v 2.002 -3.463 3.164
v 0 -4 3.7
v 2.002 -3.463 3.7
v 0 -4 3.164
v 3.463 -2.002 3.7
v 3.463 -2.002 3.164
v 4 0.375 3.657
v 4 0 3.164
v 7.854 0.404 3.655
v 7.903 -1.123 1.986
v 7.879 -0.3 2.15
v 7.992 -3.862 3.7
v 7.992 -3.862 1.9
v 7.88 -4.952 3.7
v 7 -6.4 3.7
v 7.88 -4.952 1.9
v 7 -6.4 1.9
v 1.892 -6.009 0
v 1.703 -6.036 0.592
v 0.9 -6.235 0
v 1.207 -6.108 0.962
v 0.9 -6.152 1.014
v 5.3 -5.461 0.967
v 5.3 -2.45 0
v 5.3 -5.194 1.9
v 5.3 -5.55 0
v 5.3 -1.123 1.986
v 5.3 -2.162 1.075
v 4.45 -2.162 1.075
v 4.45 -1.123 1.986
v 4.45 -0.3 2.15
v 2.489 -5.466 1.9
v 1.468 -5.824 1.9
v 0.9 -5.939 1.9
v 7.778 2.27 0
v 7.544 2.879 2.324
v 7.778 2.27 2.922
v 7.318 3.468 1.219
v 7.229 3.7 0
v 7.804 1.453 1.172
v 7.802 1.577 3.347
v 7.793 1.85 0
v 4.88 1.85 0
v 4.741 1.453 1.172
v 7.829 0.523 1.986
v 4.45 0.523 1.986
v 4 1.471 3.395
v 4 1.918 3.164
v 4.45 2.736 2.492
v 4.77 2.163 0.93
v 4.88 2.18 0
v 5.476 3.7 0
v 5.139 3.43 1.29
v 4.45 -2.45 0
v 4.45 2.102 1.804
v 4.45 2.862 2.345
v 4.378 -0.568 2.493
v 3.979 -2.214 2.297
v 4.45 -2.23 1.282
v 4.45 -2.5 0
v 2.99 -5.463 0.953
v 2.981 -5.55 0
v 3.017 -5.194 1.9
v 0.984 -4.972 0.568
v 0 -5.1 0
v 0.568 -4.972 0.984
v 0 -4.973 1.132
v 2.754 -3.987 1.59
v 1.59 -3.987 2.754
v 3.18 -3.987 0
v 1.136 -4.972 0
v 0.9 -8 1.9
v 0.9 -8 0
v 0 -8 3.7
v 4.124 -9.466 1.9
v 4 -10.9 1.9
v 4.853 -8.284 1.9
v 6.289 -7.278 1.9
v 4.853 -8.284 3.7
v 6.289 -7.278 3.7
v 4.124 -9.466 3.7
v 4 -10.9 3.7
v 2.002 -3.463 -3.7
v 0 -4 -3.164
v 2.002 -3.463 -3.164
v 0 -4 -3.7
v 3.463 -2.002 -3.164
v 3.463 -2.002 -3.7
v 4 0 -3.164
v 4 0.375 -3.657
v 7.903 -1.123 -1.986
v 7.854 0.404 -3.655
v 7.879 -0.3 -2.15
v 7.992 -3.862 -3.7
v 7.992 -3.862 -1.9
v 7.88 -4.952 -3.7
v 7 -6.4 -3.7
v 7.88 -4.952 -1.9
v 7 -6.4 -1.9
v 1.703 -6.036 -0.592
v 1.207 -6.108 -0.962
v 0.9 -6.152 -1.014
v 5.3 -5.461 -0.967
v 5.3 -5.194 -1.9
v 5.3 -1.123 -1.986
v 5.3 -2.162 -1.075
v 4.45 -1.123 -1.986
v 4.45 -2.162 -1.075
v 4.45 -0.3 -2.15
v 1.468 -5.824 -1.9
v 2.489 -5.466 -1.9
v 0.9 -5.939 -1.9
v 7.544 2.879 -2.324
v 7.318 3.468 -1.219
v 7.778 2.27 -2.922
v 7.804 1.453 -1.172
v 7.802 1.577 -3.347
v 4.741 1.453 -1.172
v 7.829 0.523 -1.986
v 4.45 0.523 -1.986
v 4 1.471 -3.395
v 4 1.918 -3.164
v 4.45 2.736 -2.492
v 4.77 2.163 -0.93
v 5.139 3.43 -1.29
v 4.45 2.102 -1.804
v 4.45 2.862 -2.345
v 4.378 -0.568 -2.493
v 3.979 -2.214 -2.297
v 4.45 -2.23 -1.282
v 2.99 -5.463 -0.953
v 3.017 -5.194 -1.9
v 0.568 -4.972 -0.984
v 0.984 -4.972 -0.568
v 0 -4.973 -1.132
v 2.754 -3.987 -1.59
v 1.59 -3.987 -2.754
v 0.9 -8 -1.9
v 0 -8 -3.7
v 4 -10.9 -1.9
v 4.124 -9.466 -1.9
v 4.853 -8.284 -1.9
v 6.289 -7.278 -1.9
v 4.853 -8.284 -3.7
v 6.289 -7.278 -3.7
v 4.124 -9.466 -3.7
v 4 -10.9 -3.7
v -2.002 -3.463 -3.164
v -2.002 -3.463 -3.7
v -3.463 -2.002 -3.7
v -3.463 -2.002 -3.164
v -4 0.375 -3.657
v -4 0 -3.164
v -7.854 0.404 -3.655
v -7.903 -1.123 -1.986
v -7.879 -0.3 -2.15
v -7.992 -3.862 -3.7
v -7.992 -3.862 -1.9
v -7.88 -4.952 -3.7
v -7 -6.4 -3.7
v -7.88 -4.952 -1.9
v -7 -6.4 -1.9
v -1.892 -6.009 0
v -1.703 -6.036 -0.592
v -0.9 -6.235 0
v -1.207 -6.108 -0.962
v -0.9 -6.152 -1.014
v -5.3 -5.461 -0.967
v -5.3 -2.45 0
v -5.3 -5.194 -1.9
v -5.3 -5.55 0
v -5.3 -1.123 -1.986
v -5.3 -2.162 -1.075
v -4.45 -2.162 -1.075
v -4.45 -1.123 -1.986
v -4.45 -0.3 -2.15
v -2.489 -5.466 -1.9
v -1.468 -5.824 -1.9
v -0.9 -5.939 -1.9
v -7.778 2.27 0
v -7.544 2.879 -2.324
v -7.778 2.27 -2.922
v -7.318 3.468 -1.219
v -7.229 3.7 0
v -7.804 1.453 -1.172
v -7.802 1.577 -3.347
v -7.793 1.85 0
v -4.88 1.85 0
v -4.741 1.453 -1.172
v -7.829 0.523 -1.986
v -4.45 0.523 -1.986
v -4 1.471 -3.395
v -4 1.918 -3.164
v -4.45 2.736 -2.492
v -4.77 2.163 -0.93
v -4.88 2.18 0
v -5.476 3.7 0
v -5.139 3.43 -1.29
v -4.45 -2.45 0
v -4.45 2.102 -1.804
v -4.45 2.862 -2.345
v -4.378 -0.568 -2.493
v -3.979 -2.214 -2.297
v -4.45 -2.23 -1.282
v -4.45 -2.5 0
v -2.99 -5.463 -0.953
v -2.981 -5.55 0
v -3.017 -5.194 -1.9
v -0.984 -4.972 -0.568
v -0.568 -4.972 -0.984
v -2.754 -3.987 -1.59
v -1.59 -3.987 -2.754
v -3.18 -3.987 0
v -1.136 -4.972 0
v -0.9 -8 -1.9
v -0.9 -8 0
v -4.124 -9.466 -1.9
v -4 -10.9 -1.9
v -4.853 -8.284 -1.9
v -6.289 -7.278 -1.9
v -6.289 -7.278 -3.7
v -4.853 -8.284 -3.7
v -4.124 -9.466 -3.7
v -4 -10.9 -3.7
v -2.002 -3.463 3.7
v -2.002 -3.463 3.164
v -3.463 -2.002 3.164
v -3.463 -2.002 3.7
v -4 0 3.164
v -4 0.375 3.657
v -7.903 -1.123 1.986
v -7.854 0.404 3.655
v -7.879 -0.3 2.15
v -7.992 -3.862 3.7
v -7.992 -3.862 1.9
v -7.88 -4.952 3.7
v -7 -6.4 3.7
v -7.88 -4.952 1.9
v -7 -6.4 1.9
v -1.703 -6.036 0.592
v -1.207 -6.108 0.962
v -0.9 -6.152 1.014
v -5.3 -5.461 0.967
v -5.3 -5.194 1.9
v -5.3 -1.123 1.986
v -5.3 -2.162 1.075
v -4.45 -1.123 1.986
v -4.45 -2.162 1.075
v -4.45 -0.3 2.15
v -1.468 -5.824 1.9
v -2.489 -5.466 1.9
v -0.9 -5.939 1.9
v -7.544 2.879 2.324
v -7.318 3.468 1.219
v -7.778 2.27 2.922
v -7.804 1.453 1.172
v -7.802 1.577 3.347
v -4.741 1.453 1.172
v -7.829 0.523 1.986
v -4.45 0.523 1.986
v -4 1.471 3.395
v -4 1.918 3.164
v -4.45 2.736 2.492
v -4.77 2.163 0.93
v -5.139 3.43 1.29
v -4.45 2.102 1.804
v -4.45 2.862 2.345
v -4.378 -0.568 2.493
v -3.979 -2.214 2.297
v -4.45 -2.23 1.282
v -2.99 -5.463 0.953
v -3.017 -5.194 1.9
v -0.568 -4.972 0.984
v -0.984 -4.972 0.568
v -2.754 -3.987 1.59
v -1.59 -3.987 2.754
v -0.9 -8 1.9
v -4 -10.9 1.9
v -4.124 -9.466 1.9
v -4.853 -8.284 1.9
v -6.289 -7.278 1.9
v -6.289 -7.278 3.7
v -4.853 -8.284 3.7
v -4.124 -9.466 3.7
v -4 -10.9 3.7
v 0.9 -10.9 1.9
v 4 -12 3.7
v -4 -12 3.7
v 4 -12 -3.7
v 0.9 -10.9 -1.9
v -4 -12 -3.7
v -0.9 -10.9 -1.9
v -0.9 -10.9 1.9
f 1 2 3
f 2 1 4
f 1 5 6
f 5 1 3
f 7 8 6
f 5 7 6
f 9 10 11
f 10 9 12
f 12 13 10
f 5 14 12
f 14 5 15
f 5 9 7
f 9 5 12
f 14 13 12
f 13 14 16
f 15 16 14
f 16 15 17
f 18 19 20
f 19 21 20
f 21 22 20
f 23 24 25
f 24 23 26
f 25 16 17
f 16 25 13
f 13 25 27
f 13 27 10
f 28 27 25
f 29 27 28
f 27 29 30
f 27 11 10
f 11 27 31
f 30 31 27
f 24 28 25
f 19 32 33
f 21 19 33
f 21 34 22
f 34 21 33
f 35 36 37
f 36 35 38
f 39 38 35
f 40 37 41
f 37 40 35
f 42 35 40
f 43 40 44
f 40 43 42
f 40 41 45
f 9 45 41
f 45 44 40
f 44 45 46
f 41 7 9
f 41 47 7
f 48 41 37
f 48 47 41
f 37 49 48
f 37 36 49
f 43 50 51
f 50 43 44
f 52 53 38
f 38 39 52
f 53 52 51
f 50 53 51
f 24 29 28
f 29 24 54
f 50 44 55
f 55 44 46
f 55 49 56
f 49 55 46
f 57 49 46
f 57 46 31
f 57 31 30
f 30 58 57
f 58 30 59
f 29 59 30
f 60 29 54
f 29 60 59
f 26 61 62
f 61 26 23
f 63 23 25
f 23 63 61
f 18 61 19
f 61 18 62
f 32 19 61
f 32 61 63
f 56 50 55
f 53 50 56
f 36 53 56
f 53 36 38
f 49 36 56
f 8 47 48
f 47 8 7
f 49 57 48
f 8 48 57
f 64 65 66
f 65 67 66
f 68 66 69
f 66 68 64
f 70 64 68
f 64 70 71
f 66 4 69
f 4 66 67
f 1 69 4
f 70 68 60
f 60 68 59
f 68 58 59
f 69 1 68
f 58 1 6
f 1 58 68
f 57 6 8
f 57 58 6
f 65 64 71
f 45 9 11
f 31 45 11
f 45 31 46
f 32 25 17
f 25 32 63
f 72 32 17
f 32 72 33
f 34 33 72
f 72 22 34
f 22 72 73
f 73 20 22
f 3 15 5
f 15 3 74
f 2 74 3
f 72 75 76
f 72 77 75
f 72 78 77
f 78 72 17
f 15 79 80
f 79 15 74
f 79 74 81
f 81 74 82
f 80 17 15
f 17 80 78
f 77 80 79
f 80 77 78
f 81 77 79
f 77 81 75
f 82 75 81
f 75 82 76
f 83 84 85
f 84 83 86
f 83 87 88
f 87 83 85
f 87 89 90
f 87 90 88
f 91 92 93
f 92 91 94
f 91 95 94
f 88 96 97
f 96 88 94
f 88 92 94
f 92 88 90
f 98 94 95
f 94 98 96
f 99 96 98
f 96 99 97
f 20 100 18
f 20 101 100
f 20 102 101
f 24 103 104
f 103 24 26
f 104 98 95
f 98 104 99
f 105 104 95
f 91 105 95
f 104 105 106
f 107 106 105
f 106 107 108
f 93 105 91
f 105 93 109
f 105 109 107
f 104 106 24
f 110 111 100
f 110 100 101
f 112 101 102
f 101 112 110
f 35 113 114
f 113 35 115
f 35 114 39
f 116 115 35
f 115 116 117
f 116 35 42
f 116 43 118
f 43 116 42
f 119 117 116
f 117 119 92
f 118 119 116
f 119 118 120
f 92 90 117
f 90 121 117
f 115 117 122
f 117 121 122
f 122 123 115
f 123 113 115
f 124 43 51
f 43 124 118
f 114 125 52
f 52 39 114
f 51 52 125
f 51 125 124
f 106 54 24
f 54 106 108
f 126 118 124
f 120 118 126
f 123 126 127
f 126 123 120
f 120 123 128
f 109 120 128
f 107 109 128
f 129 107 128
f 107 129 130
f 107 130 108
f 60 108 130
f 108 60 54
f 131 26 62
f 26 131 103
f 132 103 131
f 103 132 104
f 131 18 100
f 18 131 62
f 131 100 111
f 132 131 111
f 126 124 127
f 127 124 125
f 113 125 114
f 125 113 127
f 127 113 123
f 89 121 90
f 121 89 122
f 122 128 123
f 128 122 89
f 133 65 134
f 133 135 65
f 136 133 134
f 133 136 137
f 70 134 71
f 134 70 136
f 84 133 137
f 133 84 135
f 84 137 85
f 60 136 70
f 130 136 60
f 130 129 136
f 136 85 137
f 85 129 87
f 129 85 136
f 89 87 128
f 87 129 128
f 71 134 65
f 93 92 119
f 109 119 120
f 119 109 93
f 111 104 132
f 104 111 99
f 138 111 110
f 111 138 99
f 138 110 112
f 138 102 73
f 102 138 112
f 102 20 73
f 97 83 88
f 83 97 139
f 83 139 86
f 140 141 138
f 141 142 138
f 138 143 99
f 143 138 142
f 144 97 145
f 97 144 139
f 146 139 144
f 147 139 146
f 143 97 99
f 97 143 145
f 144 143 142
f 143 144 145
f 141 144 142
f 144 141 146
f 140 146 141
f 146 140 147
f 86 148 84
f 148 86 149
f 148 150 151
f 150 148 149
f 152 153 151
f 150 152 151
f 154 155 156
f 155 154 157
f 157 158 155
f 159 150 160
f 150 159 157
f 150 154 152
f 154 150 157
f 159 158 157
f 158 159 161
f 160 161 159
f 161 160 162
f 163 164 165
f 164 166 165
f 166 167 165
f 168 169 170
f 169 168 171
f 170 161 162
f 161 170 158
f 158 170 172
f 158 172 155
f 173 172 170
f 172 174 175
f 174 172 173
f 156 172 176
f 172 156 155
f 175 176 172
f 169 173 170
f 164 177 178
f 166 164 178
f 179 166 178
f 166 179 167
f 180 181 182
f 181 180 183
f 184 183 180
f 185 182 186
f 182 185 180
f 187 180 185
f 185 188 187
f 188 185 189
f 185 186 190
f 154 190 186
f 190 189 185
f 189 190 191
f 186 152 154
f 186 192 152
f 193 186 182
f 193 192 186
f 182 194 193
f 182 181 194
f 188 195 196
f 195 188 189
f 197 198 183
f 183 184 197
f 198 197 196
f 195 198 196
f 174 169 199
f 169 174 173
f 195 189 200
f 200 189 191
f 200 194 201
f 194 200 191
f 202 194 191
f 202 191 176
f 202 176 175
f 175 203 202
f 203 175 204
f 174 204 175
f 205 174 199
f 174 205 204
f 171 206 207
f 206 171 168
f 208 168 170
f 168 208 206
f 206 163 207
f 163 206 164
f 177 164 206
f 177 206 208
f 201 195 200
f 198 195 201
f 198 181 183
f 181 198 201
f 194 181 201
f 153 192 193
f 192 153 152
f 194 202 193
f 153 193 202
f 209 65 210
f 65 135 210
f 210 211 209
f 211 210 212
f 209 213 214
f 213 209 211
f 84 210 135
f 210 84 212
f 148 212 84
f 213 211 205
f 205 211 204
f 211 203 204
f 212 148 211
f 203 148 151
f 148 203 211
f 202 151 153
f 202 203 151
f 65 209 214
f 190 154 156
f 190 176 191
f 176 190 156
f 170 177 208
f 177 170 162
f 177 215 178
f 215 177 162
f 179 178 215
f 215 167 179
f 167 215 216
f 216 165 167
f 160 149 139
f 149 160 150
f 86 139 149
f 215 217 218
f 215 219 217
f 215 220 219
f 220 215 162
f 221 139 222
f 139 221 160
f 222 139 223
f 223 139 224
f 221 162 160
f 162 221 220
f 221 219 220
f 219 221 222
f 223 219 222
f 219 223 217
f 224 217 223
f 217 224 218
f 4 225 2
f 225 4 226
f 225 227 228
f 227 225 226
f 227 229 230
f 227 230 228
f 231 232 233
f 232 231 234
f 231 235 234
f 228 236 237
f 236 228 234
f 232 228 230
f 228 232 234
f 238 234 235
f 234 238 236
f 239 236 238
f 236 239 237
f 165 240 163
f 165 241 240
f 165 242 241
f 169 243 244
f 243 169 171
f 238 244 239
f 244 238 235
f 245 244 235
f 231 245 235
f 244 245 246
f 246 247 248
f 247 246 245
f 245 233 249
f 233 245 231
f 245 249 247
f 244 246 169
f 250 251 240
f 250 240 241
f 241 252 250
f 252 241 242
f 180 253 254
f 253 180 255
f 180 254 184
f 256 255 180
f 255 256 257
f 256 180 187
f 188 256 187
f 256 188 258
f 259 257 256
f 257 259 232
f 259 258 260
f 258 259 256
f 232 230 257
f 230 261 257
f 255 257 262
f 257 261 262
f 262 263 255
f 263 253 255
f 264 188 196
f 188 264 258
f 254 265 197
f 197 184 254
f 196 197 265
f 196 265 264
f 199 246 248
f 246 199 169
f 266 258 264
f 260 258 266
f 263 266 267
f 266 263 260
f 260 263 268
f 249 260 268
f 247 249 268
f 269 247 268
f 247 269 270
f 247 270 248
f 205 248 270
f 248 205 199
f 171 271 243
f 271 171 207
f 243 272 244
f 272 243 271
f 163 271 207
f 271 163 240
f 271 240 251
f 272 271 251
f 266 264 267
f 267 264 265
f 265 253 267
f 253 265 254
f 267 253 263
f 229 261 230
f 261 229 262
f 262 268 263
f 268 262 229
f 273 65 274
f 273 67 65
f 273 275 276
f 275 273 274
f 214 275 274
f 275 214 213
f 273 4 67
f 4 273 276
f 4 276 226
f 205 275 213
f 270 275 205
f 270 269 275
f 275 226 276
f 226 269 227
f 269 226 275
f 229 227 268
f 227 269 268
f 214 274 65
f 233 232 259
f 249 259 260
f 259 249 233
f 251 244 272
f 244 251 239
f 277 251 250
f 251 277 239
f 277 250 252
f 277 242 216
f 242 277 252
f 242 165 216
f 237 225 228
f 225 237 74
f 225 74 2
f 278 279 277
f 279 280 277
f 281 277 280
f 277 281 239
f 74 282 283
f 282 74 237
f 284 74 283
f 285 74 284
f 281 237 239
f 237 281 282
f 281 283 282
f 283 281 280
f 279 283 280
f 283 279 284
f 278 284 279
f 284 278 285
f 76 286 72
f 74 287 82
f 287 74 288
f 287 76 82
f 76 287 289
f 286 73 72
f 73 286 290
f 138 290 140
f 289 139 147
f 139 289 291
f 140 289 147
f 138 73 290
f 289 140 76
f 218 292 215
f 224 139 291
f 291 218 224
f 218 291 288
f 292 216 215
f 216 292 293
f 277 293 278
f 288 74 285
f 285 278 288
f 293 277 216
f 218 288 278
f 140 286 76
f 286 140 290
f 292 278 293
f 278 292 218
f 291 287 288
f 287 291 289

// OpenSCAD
use <../../lib.scad>
use <../../p/rect.scad>
use <90617s05.scad>
$fa=1; $fs=0.2;
function ldraw_lib__s__90617s03(realsolid=false) = [
// 0 ~Constraction Socket with Square Base
// 0 Name: s\90617s03.dat
// 0 Author: Magnus Forsberg [MagFors]
// 0 !LDRAW_ORG Subpart UPDATE 2018-02
// 0 !LICENSE Licensed under CC BY 2.0 and CC BY 4.0 : see CAreadme.txt
// 
// 0 BFC CERTIFY CCW
  [0,"BFC","CERTIFY"],
  [0,"BFC","CCW"],
// 
// 0 !HISTORY 2018-12-08 [PTadmin] Official Update 2018-02
// 
// 
// 1 16 0 0 0 1 0 0 0 1 0 0 0 1 s\90617s05.dat
  [1,16,0,0,0,1,0,0,0,1,0,0,0,1, ldraw_lib__s__90617s05(realsolid)],
// 1 16 0 0 0 1 0 0 0 -1 0 0 0 1 s\90617s05.dat
  [1,16,0,0,0,1,0,0,0,-1,0,0,0,1, ldraw_lib__s__90617s05(realsolid)],
// 1 16 0 0 0 -1 0 0 0 -1 0 0 0 1 s\90617s05.dat
  [1,16,0,0,0,-1,0,0,0,-1,0,0,0,1, ldraw_lib__s__90617s05(realsolid)],
// 1 16 0 0 0 -1 0 0 0 1 0 0 0 1 s\90617s05.dat
  [1,16,0,0,0,-1,0,0,0,1,0,0,0,1, ldraw_lib__s__90617s05(realsolid)],
// 2 24 10 -9.25 -27.25 10 -9.25 -30
  [2,24,10,-9.25,-27.25,10,-9.25,-30],
// 2 24 10 9.25 -27.25 10 9.25 -30
  [2,24,10,9.25,-27.25,10,9.25,-30],
// 2 24 2.25 -4.75 -27.25 2.25 -4.75 -20
  [2,24,2.25,-4.75,-27.25,2.25,-4.75,-20],
// 2 24 2.25 4.75 -20 2.25 4.75 -27.25
  [2,24,2.25,4.75,-20,2.25,4.75,-27.25],
// 3 16 10 -4.75 -27.25 2.25 -4.75 -27.25 2.25 -4.75 -20
  [3,16,10,-4.75,-27.25,2.25,-4.75,-27.25,2.25,-4.75,-20],
// 4 16 10 -9.25 -30 10 -9.25 -27.25 0 -9.25 -20 -10 -9.25 -30
  [4,16,10,-9.25,-30,10,-9.25,-27.25,0,-9.25,-20,-10,-9.25,-30],
// 4 16 10 -4.75 -27.25 10 -9.25 -27.25 10 -9.25 -30 10 9.25 -30
  [4,16,10,-4.75,-27.25,10,-9.25,-27.25,10,-9.25,-30,10,9.25,-30],
// 4 16 2.25 0 -20 2.25 -4.75 -20 2.25 -4.75 -27.25 2.25 4.75 -27.25
  [4,16,2.25,0,-20,2.25,-4.75,-20,2.25,-4.75,-27.25,2.25,4.75,-27.25],
// 3 16 2.25 4.75 -20 2.25 4.75 -27.25 10 4.75 -27.25
  [3,16,2.25,4.75,-20,2.25,4.75,-27.25,10,4.75,-27.25],
// 4 16 0 9.25 -20 10 9.25 -27.25 10 9.25 -30 -10 9.25 -30
  [4,16,0,9.25,-20,10,9.25,-27.25,10,9.25,-30,-10,9.25,-30],
// 3 16 10 4.75 -27.25 10 9.25 -30 10 9.25 -27.25
  [3,16,10,4.75,-27.25,10,9.25,-30,10,9.25,-27.25],
// 3 16 2.25 4.75 -20 2.25 0 -20 2.25 4.75 -27.25
  [3,16,2.25,4.75,-20,2.25,0,-20,2.25,4.75,-27.25],
// 3 16 10 9.25 -30 10 4.75 -27.25 10 -4.75 -27.25
  [3,16,10,9.25,-30,10,4.75,-27.25,10,-4.75,-27.25],
// 2 24 -10 9.25 -27.25 -10 9.25 -30
  [2,24,-10,9.25,-27.25,-10,9.25,-30],
// 2 24 -10 -9.25 -27.25 -10 -9.25 -30
  [2,24,-10,-9.25,-27.25,-10,-9.25,-30],
// 2 24 -2.25 4.75 -27.25 -2.25 4.75 -20
  [2,24,-2.25,4.75,-27.25,-2.25,4.75,-20],
// 2 24 -2.25 -4.75 -20 -2.25 -4.75 -27.25
  [2,24,-2.25,-4.75,-20,-2.25,-4.75,-27.25],
// 3 16 -10 4.75 -27.25 -2.25 4.75 -27.25 -2.25 4.75 -20
  [3,16,-10,4.75,-27.25,-2.25,4.75,-27.25,-2.25,4.75,-20],
// 3 16 -10 9.25 -27.25 0 9.25 -20 -10 9.25 -30
  [3,16,-10,9.25,-27.25,0,9.25,-20,-10,9.25,-30],
// 4 16 -10 4.75 -27.25 -10 9.25 -27.25 -10 9.25 -30 -10 -9.25 -30
  [4,16,-10,4.75,-27.25,-10,9.25,-27.25,-10,9.25,-30,-10,-9.25,-30],
// 4 16 -2.25 0 -20 -2.25 4.75 -20 -2.25 4.75 -27.25 -2.25 -4.75 -27.25
  [4,16,-2.25,0,-20,-2.25,4.75,-20,-2.25,4.75,-27.25,-2.25,-4.75,-27.25],
// 3 16 -2.25 -4.75 -20 -2.25 -4.75 -27.25 -10 -4.75 -27.25
  [3,16,-2.25,-4.75,-20,-2.25,-4.75,-27.25,-10,-4.75,-27.25],
// 3 16 -10 -9.25 -30 0 -9.25 -20 -10 -9.25 -27.25
  [3,16,-10,-9.25,-30,0,-9.25,-20,-10,-9.25,-27.25],
// 3 16 -10 -9.25 -27.25 -10 -4.75 -27.25 -10 -9.25 -30
  [3,16,-10,-9.25,-27.25,-10,-4.75,-27.25,-10,-9.25,-30],
// 3 16 -2.25 -4.75 -27.25 -2.25 -4.75 -20 -2.25 0 -20
  [3,16,-2.25,-4.75,-27.25,-2.25,-4.75,-20,-2.25,0,-20],
// 3 16 -10 4.75 -27.25 -10 -9.25 -30 -10 -4.75 -27.25
  [3,16,-10,4.75,-27.25,-10,-9.25,-30,-10,-4.75,-27.25],
// 1 16 6.125 0 -27.25 0 0 3.875 -4.75 0 0 0 -1 0 rect.dat
  [1,16,6.125,0,-27.25,0,0,3.875,-4.75,0,0,0,-1,0, ldraw_lib__rect(realsolid)],
// 1 16 -6.125 0 -27.25 0 0 -3.875 4.75 0 0 0 -1 0 rect.dat
  [1,16,-6.125,0,-27.25,0,0,-3.875,4.75,0,0,0,-1,0, ldraw_lib__rect(realsolid)],
// 1 16 0 0 -30 10 0 0 0 0 -9.25 0 1 0 rect.dat
  [1,16,0,0,-30,10,0,0,0,0,-9.25,0,1,0, ldraw_lib__rect(realsolid)],
];
module ldraw_lib__s__90617s03(step=0, col=false, unit=2/5, alt=false, line=0.2, solid=!$preview)
    makepoly(ldraw_lib__s__90617s03(solid), step=step, col=col, unit=unit, alt=alt, line=line, solid=solid);
ldraw_lib__s__90617s03(line=0.2);
